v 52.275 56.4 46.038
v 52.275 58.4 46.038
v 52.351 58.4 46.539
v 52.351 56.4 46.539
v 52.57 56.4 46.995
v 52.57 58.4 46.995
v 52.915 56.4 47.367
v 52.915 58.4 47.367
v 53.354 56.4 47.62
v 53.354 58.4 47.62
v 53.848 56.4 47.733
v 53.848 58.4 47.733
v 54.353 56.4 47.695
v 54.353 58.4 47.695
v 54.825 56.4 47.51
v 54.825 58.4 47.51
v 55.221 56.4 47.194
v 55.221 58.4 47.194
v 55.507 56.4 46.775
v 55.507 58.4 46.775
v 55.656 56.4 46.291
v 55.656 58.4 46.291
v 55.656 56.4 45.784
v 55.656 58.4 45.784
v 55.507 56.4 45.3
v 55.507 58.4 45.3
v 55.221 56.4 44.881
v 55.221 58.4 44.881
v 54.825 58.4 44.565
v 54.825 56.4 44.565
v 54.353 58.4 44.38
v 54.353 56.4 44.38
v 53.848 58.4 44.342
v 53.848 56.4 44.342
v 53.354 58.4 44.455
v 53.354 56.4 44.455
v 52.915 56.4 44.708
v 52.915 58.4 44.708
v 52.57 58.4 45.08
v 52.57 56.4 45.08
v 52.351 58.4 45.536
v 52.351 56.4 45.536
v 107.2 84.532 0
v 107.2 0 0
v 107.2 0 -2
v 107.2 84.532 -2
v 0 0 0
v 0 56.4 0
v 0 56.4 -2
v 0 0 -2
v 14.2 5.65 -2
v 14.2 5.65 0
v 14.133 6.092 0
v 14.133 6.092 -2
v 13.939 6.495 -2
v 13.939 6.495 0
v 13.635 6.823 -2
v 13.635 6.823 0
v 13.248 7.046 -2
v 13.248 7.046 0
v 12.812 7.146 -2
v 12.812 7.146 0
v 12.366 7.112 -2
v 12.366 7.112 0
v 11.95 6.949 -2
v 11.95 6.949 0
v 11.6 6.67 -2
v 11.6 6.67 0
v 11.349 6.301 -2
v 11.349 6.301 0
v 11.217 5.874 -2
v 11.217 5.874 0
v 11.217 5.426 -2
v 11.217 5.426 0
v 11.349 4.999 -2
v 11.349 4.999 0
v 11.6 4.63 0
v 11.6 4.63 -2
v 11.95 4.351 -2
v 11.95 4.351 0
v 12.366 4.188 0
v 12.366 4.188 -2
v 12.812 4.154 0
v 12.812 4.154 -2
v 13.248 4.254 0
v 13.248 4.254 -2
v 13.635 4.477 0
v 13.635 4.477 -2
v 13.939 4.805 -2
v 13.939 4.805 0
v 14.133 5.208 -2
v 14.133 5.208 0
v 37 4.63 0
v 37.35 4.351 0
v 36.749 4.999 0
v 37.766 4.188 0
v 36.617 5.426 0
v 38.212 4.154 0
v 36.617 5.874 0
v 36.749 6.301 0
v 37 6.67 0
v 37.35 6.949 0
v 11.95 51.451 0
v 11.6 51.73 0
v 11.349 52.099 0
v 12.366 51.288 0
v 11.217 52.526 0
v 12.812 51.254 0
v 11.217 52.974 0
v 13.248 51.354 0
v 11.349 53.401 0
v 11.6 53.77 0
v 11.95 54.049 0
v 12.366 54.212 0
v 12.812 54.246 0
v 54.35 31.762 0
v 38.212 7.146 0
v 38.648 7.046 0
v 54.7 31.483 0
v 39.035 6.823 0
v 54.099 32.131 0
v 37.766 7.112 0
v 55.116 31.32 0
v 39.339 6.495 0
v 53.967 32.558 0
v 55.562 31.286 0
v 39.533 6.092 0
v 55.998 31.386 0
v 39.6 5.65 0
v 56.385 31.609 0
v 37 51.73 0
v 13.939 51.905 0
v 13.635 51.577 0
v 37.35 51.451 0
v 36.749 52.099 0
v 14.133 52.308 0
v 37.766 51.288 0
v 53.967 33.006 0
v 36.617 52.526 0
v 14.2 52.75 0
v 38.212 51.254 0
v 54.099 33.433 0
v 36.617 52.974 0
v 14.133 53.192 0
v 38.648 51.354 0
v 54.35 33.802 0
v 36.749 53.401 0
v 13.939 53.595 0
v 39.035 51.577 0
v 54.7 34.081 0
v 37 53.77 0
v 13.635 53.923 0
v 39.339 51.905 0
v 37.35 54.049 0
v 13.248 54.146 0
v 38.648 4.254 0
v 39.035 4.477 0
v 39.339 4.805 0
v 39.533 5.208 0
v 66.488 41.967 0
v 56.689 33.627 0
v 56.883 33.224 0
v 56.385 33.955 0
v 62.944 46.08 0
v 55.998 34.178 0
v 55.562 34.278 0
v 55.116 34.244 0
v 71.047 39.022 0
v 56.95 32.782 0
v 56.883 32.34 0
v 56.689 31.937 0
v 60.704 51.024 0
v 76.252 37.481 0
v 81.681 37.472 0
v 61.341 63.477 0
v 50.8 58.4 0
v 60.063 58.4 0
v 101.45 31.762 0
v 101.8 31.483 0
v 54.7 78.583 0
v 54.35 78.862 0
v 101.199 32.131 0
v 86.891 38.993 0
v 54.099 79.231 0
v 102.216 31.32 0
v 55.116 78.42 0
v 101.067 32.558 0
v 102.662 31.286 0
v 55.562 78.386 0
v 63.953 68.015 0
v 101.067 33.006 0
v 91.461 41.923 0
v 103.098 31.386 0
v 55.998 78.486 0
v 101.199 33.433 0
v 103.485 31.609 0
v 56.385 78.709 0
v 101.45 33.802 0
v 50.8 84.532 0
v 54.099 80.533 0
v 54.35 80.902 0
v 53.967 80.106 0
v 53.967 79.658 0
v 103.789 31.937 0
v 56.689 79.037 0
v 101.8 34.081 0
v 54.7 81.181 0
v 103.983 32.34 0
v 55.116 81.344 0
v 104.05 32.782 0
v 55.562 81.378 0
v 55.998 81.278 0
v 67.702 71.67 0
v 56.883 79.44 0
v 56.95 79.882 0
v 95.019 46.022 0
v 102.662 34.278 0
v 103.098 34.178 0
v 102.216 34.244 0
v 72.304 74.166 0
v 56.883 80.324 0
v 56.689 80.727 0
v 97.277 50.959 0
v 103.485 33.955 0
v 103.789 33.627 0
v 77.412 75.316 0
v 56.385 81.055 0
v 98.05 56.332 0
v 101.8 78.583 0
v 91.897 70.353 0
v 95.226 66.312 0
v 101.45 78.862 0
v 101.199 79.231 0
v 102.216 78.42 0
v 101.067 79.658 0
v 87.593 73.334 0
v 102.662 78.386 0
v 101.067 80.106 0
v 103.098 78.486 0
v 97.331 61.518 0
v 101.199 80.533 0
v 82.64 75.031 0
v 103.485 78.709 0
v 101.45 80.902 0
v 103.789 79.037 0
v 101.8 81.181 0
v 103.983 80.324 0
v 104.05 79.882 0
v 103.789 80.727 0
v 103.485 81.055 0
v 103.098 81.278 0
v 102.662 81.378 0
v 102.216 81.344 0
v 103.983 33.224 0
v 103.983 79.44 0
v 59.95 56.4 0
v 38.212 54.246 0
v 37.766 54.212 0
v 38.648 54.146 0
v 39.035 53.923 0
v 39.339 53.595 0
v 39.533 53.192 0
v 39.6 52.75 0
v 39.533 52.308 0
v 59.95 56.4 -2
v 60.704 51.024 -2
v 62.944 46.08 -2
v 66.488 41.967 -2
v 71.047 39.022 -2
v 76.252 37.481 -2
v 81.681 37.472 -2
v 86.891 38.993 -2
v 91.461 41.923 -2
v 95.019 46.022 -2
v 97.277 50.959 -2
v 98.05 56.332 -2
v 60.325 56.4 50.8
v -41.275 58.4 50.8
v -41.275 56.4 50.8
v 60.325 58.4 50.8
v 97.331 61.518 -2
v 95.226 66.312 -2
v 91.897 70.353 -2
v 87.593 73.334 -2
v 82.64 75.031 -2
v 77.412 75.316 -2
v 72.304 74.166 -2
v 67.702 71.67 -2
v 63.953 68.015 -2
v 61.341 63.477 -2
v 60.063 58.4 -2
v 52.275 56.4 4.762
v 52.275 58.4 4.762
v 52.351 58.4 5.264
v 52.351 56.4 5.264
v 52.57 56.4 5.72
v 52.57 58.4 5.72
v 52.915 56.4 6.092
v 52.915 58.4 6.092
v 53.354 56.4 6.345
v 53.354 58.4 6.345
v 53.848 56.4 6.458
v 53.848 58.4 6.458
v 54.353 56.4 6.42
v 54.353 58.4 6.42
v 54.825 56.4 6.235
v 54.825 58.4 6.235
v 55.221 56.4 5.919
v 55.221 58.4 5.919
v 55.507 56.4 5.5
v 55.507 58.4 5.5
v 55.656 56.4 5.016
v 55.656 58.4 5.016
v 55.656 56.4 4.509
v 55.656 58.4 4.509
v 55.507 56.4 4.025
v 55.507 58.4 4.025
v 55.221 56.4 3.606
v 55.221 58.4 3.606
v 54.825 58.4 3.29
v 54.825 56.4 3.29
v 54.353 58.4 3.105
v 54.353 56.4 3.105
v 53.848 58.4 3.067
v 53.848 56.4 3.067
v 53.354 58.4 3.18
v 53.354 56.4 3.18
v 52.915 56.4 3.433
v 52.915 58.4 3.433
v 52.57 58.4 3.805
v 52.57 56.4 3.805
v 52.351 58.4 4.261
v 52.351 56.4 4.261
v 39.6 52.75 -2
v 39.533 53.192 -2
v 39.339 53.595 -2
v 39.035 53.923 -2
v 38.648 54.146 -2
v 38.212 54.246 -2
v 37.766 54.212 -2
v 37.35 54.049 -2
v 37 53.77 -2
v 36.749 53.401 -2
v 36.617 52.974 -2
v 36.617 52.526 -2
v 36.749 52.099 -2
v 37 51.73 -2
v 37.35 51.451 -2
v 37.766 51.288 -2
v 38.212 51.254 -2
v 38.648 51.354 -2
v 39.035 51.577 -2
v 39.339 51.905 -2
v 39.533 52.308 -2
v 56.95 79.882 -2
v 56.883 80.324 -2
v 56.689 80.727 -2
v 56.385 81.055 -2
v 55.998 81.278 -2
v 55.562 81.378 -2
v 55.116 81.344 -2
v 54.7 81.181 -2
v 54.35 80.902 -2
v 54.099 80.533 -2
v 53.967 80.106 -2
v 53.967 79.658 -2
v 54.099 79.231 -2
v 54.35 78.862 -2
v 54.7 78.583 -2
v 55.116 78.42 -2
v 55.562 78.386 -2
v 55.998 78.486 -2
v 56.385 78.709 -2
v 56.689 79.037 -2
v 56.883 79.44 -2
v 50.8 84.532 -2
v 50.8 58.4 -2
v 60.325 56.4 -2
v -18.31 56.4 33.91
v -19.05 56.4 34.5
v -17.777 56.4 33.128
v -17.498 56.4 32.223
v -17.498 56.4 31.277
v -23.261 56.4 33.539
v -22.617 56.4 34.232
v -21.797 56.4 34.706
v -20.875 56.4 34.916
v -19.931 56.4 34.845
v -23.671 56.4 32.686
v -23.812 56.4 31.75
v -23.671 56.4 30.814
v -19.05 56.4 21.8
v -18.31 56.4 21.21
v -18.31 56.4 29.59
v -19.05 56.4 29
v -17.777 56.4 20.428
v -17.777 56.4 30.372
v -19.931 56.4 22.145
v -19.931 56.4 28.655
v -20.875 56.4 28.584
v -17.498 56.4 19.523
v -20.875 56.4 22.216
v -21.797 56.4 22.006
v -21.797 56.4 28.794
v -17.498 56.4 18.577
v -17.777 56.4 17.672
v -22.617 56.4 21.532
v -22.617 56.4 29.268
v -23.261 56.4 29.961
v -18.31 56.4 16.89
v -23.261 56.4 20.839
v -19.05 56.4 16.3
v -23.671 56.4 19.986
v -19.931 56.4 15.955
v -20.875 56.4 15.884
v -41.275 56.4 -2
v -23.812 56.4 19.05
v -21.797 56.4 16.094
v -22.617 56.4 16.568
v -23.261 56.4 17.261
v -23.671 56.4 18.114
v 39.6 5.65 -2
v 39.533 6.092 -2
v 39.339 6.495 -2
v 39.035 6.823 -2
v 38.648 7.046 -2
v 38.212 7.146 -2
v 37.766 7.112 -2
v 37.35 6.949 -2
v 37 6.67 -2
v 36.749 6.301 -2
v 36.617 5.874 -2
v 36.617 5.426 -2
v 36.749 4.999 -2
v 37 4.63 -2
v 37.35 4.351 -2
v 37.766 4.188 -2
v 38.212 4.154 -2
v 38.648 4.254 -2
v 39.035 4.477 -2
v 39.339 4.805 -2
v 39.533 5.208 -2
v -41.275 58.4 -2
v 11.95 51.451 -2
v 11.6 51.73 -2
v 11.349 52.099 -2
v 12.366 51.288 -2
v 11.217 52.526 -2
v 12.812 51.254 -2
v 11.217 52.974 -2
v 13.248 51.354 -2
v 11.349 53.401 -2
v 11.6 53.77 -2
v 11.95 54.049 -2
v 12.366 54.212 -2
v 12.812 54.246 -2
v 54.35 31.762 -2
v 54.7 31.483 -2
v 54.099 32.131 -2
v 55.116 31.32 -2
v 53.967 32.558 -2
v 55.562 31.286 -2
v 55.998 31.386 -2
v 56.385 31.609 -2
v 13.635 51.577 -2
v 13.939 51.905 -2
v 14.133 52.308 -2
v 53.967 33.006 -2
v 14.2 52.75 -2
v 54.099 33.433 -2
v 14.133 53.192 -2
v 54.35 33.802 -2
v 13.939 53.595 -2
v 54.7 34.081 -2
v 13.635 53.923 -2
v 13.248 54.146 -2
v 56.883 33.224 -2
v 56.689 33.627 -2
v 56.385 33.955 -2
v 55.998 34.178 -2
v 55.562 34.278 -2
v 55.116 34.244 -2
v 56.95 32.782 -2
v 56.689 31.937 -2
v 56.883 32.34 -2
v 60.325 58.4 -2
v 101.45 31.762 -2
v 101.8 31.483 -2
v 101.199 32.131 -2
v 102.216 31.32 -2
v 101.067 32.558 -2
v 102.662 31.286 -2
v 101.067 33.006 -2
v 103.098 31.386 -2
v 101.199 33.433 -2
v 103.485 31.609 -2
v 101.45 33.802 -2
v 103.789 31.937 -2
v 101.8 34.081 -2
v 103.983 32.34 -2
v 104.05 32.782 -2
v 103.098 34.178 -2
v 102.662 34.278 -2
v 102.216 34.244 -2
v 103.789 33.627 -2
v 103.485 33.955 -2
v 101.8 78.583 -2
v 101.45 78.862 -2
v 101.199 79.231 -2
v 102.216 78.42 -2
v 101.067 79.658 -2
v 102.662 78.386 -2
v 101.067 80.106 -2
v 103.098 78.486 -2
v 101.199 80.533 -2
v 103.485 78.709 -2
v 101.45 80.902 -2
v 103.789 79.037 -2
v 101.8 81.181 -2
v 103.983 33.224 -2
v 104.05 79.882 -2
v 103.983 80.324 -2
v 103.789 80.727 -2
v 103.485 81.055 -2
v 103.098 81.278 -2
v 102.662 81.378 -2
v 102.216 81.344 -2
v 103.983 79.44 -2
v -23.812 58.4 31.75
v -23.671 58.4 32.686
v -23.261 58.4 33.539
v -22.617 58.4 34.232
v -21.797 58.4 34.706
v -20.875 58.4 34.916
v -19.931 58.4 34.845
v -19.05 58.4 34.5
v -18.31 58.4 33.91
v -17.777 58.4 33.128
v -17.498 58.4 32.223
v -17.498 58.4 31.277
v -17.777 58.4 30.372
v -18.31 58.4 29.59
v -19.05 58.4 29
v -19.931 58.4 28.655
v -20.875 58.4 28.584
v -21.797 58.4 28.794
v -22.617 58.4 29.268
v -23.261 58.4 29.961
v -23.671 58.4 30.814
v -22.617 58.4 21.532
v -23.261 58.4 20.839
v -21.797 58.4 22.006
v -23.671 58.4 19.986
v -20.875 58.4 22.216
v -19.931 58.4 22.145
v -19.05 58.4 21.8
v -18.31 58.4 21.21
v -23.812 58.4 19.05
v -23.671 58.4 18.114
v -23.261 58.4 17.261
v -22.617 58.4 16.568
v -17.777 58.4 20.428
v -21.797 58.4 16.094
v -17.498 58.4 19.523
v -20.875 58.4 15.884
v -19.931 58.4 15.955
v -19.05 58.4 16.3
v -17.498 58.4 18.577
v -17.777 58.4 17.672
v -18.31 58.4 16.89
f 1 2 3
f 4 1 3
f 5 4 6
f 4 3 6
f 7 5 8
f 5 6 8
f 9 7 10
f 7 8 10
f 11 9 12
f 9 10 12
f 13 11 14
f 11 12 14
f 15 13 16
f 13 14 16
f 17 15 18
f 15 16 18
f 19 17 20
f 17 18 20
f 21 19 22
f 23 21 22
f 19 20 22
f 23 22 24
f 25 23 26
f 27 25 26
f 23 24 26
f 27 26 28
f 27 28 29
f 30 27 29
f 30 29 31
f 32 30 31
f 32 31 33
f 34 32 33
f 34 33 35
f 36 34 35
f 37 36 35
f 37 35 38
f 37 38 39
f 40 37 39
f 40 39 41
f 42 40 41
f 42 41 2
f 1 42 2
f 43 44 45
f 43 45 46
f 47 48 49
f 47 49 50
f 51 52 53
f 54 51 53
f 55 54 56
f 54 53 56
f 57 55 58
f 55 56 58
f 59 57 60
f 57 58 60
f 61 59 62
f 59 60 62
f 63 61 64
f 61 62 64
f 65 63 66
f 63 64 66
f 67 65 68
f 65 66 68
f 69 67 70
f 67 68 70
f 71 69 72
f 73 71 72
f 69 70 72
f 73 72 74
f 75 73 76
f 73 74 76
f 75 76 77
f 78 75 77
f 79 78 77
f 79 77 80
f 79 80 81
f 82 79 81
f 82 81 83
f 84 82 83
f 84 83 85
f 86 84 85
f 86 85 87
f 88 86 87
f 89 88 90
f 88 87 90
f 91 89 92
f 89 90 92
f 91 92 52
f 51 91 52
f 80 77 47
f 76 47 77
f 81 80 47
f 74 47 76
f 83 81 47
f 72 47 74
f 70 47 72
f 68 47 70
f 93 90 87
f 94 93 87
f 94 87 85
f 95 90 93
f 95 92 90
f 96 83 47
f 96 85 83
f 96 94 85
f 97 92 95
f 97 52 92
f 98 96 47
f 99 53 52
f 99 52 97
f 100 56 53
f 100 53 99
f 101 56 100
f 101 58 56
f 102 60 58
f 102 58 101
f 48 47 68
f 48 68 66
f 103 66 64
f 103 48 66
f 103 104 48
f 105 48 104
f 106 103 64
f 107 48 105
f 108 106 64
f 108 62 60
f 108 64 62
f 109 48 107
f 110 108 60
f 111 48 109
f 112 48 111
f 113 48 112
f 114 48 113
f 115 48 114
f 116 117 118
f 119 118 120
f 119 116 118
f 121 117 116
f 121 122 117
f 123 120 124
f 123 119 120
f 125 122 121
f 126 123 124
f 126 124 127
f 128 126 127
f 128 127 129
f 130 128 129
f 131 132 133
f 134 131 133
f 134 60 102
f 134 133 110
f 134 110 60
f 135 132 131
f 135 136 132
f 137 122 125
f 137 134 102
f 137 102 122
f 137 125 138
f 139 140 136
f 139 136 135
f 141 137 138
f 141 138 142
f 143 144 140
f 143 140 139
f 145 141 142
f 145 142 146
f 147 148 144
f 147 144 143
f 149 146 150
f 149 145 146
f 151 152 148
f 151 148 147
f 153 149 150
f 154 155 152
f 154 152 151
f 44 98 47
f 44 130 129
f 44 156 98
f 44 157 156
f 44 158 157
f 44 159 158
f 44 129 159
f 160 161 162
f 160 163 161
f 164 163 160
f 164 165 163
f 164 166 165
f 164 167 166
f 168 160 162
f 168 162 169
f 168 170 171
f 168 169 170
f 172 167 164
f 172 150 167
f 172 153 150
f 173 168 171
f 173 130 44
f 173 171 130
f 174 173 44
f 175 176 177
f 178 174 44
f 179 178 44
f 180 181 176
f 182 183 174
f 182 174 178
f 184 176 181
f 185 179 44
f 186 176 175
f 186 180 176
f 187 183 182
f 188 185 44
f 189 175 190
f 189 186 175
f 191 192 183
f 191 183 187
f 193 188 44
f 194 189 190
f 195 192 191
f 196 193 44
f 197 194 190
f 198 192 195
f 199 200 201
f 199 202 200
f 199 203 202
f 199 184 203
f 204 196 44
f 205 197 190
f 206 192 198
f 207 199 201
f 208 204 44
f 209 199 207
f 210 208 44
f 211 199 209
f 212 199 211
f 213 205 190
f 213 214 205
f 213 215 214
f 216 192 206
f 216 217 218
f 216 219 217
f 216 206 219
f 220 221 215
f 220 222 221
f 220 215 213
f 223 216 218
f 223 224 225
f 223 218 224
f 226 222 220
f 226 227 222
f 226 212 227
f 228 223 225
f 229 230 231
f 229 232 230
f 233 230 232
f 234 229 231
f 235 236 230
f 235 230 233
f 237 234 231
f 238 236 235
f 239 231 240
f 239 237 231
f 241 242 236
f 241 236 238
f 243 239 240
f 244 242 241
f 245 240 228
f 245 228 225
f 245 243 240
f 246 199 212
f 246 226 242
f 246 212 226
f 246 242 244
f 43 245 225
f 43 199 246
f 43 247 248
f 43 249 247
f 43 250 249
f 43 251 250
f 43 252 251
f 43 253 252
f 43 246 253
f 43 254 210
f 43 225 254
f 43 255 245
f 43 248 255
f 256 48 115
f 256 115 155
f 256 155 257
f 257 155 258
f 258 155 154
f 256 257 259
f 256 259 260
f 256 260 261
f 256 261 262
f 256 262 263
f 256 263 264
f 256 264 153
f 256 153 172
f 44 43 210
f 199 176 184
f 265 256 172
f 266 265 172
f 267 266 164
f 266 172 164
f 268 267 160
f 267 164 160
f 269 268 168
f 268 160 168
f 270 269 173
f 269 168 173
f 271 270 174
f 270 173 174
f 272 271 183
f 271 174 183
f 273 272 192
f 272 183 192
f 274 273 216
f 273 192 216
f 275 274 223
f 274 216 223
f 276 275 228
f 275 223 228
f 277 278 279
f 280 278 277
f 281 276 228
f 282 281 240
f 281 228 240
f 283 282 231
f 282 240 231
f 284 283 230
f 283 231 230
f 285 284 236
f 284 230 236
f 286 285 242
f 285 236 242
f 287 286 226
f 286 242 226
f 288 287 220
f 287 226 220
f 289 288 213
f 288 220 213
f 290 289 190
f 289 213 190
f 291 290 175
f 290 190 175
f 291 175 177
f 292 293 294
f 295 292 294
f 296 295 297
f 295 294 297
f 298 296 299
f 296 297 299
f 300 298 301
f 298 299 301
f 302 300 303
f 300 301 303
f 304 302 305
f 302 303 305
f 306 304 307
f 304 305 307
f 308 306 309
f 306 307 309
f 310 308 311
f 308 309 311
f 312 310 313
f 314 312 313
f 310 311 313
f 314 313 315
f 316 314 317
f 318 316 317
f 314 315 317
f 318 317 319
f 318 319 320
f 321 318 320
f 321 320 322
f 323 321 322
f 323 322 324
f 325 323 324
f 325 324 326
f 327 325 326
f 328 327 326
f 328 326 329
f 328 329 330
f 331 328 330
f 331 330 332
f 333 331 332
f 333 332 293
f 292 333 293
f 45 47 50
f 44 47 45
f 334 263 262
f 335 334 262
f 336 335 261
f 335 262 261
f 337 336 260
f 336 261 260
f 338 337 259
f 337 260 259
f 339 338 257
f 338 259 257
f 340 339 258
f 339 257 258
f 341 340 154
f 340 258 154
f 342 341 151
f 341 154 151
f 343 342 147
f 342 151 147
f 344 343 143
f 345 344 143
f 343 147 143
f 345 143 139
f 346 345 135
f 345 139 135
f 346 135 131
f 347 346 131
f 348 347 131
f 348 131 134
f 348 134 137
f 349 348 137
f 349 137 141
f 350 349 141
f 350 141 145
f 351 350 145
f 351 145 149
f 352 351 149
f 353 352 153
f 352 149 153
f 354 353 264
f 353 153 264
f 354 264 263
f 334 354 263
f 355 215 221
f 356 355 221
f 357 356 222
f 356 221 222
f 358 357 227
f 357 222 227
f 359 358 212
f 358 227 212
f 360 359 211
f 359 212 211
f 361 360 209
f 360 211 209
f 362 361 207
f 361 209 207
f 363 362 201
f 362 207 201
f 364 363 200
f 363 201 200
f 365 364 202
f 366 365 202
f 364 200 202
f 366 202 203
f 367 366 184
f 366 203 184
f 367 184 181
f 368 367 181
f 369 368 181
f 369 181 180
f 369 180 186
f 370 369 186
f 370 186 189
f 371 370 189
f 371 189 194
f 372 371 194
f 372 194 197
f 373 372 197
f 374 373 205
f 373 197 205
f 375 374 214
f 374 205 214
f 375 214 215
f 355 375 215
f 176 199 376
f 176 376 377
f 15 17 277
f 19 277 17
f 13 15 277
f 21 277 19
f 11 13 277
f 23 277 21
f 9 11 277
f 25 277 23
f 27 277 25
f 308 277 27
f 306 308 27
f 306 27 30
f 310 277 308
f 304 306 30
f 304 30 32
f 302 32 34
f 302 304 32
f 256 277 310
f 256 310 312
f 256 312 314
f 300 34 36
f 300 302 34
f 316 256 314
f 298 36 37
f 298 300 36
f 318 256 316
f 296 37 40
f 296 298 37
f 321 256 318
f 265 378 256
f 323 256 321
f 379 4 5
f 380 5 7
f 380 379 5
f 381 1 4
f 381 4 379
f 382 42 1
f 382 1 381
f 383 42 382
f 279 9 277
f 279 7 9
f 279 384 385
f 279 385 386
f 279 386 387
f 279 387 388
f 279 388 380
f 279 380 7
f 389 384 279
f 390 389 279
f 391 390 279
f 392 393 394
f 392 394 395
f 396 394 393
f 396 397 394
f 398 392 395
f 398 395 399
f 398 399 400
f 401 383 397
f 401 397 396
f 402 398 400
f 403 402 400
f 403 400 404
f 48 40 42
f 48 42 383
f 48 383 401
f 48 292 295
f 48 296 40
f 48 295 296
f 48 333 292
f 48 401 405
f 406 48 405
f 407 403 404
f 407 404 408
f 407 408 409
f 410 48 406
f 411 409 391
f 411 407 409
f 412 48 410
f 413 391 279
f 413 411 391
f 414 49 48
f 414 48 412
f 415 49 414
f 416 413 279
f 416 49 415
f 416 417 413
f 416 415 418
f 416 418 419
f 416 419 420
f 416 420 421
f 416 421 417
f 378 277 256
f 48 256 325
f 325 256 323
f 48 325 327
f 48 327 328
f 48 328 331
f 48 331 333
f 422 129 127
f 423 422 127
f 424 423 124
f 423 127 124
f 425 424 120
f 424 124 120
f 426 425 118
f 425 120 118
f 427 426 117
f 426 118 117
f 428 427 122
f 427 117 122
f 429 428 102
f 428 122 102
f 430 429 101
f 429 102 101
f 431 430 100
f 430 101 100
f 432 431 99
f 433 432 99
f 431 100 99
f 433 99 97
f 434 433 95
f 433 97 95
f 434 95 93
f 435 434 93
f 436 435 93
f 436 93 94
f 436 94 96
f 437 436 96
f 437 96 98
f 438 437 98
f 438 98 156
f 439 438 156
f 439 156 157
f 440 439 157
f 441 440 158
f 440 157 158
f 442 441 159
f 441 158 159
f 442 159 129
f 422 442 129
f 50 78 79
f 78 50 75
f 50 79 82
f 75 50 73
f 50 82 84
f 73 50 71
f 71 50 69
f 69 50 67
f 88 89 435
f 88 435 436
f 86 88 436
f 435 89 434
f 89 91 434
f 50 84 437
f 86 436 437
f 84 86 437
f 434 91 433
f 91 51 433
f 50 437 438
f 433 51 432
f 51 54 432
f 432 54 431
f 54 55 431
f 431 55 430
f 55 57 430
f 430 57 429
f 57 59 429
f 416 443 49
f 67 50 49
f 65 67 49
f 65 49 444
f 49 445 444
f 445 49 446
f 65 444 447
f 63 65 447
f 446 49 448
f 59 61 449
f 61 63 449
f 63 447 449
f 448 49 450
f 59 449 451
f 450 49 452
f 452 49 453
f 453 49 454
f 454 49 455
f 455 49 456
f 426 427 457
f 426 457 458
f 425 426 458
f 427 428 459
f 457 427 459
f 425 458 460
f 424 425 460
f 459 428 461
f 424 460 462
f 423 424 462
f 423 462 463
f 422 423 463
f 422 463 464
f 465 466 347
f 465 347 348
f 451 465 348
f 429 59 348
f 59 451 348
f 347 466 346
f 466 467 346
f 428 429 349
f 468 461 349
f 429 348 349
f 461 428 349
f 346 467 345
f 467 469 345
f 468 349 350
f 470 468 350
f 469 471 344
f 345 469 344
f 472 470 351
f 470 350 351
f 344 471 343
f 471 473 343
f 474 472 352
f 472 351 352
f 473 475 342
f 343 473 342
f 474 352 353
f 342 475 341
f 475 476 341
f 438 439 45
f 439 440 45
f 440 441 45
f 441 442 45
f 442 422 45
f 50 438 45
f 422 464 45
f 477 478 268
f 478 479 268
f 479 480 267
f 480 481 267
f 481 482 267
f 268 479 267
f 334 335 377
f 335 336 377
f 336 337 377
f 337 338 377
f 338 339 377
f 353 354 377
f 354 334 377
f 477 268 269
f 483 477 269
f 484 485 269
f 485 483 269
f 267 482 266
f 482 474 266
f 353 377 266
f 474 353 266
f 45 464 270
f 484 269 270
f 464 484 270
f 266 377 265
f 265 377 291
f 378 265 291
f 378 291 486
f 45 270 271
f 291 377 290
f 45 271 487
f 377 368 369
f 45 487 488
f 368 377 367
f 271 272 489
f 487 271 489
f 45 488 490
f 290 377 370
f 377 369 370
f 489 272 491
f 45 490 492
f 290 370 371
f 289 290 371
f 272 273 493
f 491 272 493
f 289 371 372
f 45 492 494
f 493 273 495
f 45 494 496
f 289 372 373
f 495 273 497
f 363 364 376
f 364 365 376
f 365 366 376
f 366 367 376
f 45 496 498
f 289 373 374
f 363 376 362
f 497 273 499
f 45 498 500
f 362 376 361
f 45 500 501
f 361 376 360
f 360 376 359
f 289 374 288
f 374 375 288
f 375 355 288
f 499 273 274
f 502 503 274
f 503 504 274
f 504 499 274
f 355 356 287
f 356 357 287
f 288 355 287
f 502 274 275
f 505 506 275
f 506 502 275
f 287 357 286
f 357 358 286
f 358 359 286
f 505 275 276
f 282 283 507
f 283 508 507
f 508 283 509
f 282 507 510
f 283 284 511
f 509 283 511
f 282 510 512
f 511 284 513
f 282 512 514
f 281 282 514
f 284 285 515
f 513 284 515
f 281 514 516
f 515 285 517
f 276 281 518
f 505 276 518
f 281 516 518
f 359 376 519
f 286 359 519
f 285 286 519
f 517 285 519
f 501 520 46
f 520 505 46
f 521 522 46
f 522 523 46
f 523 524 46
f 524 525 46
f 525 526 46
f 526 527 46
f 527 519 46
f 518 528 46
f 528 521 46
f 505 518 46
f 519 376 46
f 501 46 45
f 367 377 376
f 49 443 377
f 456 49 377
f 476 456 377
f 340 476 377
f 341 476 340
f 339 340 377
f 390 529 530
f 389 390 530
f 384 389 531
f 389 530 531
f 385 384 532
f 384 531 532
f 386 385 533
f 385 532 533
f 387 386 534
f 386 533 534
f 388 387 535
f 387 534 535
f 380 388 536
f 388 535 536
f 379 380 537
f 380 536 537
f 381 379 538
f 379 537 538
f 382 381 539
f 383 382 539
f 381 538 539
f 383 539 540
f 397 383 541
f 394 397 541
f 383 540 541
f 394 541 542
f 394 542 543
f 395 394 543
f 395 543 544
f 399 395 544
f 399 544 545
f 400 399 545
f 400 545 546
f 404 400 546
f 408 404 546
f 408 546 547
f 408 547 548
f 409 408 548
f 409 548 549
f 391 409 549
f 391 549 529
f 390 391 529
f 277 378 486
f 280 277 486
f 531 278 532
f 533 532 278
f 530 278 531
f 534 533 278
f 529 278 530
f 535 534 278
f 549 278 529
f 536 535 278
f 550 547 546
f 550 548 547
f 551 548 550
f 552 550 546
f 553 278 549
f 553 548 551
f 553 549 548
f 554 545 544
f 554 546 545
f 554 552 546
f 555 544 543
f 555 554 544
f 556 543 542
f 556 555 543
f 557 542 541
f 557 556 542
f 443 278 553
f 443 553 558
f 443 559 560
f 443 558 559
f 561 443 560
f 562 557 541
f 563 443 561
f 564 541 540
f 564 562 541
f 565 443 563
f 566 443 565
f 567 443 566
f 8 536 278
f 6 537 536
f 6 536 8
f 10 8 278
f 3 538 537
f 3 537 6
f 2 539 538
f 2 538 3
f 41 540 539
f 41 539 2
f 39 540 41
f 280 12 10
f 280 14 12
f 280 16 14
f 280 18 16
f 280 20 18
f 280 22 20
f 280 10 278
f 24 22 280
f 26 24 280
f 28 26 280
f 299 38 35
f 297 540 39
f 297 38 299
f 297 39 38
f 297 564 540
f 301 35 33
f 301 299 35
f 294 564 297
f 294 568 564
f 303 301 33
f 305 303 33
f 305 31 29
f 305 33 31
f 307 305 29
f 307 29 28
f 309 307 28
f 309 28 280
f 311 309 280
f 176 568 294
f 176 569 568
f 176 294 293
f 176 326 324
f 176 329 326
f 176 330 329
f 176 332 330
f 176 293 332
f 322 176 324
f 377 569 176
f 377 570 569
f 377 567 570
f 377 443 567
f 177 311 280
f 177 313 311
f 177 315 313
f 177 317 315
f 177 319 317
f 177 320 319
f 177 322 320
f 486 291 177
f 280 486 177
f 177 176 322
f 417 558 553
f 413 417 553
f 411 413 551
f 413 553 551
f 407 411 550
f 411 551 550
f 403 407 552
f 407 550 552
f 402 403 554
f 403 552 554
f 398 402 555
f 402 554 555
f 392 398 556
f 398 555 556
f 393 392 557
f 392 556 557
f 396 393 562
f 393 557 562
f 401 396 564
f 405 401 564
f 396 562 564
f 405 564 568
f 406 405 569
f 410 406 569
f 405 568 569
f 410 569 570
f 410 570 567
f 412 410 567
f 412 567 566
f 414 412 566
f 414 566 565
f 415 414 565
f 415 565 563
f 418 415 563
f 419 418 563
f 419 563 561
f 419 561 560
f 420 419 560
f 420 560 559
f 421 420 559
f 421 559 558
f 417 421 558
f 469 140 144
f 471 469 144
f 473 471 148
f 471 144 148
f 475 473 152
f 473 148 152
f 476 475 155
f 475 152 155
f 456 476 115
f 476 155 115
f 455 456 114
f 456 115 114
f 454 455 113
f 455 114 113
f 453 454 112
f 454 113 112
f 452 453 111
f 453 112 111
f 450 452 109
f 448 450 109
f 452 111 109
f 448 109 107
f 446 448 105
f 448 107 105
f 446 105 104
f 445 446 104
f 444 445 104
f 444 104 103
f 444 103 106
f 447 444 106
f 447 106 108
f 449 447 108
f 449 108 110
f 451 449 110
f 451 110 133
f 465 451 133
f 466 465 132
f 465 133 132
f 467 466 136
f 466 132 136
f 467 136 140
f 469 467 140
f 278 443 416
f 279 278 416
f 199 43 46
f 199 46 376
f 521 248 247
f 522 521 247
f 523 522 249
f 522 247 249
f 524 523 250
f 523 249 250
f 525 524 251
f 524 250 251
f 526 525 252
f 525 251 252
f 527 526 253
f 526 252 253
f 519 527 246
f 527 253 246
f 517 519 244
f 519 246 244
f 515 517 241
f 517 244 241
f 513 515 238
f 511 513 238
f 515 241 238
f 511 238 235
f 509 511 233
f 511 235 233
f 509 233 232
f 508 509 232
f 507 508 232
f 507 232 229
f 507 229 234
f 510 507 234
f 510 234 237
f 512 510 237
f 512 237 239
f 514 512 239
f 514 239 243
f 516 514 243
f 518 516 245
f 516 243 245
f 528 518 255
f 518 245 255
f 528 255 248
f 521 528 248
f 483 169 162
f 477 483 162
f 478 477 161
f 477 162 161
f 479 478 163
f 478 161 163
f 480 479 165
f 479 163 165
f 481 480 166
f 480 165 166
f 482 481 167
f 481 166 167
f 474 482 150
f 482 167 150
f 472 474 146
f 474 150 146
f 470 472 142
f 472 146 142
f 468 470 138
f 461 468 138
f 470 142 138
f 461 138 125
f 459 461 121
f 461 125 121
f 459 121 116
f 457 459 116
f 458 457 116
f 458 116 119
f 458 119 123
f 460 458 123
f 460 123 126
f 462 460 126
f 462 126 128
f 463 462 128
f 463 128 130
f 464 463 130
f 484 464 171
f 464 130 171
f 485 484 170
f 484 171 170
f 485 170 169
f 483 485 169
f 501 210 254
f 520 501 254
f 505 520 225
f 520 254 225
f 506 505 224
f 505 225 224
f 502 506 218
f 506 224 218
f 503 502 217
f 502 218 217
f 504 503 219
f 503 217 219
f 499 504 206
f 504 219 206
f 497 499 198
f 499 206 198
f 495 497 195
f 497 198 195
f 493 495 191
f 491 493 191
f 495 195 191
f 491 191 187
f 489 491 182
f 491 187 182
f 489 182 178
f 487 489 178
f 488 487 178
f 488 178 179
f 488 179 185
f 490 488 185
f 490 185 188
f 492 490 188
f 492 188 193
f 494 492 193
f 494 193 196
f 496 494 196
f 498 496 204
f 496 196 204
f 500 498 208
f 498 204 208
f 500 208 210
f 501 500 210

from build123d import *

# Parameters (mm, degrees)
SKETCH1_R           = 1.5
SKETCH1_R_2         = 19.05
BOSS_EXTRUDE1_DEPTH = 2
BOSS_EXTRUDE2_DEPTH = 52.8
SKETCH3_R           = 1.7
CUT_EXTRUDE1_DEPTH  = 133.22344724
SKETCH4_R           = 3.175
CUT_EXTRUDE2_DEPTH  = 10


with BuildPart() as part:
    # Sketch1 → Boss-Extrude1 (new body)
    with BuildSketch(Plane.XY):
        Polygon((0, 58.4), (0, 0), (107.2, 0), (107.2, 84.53204182), (50.8, 84.53204182), (50.8, 58.4), align=None)
        with Locations((102.55, 79.88204182)):
            Circle(SKETCH1_R, mode=Mode.SUBTRACT)
        with Locations((102.55, 32.78204182)):
            Circle(SKETCH1_R, mode=Mode.SUBTRACT)
        with Locations((55.45, 32.78204182)):
            Circle(SKETCH1_R, mode=Mode.SUBTRACT)
        with Locations((55.45, 79.88204182)):
            Circle(SKETCH1_R, mode=Mode.SUBTRACT)
        with Locations((12.7, 52.75)):
            Circle(SKETCH1_R, mode=Mode.SUBTRACT)
        with Locations((38.1, 52.75)):
            Circle(SKETCH1_R, mode=Mode.SUBTRACT)
        with Locations((12.7, 5.65)):
            Circle(SKETCH1_R, mode=Mode.SUBTRACT)
        with Locations((38.1, 5.65)):
            Circle(SKETCH1_R, mode=Mode.SUBTRACT)
        with Locations((79, 56.33204182)):
            Circle(SKETCH1_R_2, mode=Mode.SUBTRACT)
    extrude(amount=-BOSS_EXTRUDE1_DEPTH)

    # Sketch2 → Boss-Extrude2 (add)
    with BuildSketch(Plane(origin=(0, 0, -2), x_dir=(-1, 0, 0), z_dir=(0, 0, -1))):
        Polygon((0, 58.4), (41.275, 58.4), (41.275, 56.4), (0, 56.4), (-60.325, 56.4), (-60.325, 58.4), align=None)
    extrude(amount=-BOSS_EXTRUDE2_DEPTH)

    # Sketch3 → Cut-Extrude1 (cut, through all)
    with BuildSketch(Plane(origin=(0, 58.4, 0), x_dir=(1, 0, 0), z_dir=(0, 1, 0))):
        with Locations(Location((53.975, -4.7625, 0), (0, 0, 180))):
            Circle(SKETCH3_R)
        with Locations(Location((53.975, -46.0375, 0), (0, 0, 180))):
            Circle(SKETCH3_R)
    extrude(amount=-CUT_EXTRUDE1_DEPTH, mode=Mode.SUBTRACT)

    # Sketch4 → Cut-Extrude2 (cut)
    with BuildSketch(Plane(origin=(0, 58.4, 0), x_dir=(1, 0, 0), z_dir=(0, 1, 0))):
        with Locations(Location((-20.6375, -19.05, 0), (0, 0, 180))):
            Circle(SKETCH4_R)
        with Locations(Location((-20.6375, -31.75, 0), (0, 0, 180))):
            Circle(SKETCH4_R)
    extrude(amount=-CUT_EXTRUDE2_DEPTH, mode=Mode.SUBTRACT)


solid = part.part
